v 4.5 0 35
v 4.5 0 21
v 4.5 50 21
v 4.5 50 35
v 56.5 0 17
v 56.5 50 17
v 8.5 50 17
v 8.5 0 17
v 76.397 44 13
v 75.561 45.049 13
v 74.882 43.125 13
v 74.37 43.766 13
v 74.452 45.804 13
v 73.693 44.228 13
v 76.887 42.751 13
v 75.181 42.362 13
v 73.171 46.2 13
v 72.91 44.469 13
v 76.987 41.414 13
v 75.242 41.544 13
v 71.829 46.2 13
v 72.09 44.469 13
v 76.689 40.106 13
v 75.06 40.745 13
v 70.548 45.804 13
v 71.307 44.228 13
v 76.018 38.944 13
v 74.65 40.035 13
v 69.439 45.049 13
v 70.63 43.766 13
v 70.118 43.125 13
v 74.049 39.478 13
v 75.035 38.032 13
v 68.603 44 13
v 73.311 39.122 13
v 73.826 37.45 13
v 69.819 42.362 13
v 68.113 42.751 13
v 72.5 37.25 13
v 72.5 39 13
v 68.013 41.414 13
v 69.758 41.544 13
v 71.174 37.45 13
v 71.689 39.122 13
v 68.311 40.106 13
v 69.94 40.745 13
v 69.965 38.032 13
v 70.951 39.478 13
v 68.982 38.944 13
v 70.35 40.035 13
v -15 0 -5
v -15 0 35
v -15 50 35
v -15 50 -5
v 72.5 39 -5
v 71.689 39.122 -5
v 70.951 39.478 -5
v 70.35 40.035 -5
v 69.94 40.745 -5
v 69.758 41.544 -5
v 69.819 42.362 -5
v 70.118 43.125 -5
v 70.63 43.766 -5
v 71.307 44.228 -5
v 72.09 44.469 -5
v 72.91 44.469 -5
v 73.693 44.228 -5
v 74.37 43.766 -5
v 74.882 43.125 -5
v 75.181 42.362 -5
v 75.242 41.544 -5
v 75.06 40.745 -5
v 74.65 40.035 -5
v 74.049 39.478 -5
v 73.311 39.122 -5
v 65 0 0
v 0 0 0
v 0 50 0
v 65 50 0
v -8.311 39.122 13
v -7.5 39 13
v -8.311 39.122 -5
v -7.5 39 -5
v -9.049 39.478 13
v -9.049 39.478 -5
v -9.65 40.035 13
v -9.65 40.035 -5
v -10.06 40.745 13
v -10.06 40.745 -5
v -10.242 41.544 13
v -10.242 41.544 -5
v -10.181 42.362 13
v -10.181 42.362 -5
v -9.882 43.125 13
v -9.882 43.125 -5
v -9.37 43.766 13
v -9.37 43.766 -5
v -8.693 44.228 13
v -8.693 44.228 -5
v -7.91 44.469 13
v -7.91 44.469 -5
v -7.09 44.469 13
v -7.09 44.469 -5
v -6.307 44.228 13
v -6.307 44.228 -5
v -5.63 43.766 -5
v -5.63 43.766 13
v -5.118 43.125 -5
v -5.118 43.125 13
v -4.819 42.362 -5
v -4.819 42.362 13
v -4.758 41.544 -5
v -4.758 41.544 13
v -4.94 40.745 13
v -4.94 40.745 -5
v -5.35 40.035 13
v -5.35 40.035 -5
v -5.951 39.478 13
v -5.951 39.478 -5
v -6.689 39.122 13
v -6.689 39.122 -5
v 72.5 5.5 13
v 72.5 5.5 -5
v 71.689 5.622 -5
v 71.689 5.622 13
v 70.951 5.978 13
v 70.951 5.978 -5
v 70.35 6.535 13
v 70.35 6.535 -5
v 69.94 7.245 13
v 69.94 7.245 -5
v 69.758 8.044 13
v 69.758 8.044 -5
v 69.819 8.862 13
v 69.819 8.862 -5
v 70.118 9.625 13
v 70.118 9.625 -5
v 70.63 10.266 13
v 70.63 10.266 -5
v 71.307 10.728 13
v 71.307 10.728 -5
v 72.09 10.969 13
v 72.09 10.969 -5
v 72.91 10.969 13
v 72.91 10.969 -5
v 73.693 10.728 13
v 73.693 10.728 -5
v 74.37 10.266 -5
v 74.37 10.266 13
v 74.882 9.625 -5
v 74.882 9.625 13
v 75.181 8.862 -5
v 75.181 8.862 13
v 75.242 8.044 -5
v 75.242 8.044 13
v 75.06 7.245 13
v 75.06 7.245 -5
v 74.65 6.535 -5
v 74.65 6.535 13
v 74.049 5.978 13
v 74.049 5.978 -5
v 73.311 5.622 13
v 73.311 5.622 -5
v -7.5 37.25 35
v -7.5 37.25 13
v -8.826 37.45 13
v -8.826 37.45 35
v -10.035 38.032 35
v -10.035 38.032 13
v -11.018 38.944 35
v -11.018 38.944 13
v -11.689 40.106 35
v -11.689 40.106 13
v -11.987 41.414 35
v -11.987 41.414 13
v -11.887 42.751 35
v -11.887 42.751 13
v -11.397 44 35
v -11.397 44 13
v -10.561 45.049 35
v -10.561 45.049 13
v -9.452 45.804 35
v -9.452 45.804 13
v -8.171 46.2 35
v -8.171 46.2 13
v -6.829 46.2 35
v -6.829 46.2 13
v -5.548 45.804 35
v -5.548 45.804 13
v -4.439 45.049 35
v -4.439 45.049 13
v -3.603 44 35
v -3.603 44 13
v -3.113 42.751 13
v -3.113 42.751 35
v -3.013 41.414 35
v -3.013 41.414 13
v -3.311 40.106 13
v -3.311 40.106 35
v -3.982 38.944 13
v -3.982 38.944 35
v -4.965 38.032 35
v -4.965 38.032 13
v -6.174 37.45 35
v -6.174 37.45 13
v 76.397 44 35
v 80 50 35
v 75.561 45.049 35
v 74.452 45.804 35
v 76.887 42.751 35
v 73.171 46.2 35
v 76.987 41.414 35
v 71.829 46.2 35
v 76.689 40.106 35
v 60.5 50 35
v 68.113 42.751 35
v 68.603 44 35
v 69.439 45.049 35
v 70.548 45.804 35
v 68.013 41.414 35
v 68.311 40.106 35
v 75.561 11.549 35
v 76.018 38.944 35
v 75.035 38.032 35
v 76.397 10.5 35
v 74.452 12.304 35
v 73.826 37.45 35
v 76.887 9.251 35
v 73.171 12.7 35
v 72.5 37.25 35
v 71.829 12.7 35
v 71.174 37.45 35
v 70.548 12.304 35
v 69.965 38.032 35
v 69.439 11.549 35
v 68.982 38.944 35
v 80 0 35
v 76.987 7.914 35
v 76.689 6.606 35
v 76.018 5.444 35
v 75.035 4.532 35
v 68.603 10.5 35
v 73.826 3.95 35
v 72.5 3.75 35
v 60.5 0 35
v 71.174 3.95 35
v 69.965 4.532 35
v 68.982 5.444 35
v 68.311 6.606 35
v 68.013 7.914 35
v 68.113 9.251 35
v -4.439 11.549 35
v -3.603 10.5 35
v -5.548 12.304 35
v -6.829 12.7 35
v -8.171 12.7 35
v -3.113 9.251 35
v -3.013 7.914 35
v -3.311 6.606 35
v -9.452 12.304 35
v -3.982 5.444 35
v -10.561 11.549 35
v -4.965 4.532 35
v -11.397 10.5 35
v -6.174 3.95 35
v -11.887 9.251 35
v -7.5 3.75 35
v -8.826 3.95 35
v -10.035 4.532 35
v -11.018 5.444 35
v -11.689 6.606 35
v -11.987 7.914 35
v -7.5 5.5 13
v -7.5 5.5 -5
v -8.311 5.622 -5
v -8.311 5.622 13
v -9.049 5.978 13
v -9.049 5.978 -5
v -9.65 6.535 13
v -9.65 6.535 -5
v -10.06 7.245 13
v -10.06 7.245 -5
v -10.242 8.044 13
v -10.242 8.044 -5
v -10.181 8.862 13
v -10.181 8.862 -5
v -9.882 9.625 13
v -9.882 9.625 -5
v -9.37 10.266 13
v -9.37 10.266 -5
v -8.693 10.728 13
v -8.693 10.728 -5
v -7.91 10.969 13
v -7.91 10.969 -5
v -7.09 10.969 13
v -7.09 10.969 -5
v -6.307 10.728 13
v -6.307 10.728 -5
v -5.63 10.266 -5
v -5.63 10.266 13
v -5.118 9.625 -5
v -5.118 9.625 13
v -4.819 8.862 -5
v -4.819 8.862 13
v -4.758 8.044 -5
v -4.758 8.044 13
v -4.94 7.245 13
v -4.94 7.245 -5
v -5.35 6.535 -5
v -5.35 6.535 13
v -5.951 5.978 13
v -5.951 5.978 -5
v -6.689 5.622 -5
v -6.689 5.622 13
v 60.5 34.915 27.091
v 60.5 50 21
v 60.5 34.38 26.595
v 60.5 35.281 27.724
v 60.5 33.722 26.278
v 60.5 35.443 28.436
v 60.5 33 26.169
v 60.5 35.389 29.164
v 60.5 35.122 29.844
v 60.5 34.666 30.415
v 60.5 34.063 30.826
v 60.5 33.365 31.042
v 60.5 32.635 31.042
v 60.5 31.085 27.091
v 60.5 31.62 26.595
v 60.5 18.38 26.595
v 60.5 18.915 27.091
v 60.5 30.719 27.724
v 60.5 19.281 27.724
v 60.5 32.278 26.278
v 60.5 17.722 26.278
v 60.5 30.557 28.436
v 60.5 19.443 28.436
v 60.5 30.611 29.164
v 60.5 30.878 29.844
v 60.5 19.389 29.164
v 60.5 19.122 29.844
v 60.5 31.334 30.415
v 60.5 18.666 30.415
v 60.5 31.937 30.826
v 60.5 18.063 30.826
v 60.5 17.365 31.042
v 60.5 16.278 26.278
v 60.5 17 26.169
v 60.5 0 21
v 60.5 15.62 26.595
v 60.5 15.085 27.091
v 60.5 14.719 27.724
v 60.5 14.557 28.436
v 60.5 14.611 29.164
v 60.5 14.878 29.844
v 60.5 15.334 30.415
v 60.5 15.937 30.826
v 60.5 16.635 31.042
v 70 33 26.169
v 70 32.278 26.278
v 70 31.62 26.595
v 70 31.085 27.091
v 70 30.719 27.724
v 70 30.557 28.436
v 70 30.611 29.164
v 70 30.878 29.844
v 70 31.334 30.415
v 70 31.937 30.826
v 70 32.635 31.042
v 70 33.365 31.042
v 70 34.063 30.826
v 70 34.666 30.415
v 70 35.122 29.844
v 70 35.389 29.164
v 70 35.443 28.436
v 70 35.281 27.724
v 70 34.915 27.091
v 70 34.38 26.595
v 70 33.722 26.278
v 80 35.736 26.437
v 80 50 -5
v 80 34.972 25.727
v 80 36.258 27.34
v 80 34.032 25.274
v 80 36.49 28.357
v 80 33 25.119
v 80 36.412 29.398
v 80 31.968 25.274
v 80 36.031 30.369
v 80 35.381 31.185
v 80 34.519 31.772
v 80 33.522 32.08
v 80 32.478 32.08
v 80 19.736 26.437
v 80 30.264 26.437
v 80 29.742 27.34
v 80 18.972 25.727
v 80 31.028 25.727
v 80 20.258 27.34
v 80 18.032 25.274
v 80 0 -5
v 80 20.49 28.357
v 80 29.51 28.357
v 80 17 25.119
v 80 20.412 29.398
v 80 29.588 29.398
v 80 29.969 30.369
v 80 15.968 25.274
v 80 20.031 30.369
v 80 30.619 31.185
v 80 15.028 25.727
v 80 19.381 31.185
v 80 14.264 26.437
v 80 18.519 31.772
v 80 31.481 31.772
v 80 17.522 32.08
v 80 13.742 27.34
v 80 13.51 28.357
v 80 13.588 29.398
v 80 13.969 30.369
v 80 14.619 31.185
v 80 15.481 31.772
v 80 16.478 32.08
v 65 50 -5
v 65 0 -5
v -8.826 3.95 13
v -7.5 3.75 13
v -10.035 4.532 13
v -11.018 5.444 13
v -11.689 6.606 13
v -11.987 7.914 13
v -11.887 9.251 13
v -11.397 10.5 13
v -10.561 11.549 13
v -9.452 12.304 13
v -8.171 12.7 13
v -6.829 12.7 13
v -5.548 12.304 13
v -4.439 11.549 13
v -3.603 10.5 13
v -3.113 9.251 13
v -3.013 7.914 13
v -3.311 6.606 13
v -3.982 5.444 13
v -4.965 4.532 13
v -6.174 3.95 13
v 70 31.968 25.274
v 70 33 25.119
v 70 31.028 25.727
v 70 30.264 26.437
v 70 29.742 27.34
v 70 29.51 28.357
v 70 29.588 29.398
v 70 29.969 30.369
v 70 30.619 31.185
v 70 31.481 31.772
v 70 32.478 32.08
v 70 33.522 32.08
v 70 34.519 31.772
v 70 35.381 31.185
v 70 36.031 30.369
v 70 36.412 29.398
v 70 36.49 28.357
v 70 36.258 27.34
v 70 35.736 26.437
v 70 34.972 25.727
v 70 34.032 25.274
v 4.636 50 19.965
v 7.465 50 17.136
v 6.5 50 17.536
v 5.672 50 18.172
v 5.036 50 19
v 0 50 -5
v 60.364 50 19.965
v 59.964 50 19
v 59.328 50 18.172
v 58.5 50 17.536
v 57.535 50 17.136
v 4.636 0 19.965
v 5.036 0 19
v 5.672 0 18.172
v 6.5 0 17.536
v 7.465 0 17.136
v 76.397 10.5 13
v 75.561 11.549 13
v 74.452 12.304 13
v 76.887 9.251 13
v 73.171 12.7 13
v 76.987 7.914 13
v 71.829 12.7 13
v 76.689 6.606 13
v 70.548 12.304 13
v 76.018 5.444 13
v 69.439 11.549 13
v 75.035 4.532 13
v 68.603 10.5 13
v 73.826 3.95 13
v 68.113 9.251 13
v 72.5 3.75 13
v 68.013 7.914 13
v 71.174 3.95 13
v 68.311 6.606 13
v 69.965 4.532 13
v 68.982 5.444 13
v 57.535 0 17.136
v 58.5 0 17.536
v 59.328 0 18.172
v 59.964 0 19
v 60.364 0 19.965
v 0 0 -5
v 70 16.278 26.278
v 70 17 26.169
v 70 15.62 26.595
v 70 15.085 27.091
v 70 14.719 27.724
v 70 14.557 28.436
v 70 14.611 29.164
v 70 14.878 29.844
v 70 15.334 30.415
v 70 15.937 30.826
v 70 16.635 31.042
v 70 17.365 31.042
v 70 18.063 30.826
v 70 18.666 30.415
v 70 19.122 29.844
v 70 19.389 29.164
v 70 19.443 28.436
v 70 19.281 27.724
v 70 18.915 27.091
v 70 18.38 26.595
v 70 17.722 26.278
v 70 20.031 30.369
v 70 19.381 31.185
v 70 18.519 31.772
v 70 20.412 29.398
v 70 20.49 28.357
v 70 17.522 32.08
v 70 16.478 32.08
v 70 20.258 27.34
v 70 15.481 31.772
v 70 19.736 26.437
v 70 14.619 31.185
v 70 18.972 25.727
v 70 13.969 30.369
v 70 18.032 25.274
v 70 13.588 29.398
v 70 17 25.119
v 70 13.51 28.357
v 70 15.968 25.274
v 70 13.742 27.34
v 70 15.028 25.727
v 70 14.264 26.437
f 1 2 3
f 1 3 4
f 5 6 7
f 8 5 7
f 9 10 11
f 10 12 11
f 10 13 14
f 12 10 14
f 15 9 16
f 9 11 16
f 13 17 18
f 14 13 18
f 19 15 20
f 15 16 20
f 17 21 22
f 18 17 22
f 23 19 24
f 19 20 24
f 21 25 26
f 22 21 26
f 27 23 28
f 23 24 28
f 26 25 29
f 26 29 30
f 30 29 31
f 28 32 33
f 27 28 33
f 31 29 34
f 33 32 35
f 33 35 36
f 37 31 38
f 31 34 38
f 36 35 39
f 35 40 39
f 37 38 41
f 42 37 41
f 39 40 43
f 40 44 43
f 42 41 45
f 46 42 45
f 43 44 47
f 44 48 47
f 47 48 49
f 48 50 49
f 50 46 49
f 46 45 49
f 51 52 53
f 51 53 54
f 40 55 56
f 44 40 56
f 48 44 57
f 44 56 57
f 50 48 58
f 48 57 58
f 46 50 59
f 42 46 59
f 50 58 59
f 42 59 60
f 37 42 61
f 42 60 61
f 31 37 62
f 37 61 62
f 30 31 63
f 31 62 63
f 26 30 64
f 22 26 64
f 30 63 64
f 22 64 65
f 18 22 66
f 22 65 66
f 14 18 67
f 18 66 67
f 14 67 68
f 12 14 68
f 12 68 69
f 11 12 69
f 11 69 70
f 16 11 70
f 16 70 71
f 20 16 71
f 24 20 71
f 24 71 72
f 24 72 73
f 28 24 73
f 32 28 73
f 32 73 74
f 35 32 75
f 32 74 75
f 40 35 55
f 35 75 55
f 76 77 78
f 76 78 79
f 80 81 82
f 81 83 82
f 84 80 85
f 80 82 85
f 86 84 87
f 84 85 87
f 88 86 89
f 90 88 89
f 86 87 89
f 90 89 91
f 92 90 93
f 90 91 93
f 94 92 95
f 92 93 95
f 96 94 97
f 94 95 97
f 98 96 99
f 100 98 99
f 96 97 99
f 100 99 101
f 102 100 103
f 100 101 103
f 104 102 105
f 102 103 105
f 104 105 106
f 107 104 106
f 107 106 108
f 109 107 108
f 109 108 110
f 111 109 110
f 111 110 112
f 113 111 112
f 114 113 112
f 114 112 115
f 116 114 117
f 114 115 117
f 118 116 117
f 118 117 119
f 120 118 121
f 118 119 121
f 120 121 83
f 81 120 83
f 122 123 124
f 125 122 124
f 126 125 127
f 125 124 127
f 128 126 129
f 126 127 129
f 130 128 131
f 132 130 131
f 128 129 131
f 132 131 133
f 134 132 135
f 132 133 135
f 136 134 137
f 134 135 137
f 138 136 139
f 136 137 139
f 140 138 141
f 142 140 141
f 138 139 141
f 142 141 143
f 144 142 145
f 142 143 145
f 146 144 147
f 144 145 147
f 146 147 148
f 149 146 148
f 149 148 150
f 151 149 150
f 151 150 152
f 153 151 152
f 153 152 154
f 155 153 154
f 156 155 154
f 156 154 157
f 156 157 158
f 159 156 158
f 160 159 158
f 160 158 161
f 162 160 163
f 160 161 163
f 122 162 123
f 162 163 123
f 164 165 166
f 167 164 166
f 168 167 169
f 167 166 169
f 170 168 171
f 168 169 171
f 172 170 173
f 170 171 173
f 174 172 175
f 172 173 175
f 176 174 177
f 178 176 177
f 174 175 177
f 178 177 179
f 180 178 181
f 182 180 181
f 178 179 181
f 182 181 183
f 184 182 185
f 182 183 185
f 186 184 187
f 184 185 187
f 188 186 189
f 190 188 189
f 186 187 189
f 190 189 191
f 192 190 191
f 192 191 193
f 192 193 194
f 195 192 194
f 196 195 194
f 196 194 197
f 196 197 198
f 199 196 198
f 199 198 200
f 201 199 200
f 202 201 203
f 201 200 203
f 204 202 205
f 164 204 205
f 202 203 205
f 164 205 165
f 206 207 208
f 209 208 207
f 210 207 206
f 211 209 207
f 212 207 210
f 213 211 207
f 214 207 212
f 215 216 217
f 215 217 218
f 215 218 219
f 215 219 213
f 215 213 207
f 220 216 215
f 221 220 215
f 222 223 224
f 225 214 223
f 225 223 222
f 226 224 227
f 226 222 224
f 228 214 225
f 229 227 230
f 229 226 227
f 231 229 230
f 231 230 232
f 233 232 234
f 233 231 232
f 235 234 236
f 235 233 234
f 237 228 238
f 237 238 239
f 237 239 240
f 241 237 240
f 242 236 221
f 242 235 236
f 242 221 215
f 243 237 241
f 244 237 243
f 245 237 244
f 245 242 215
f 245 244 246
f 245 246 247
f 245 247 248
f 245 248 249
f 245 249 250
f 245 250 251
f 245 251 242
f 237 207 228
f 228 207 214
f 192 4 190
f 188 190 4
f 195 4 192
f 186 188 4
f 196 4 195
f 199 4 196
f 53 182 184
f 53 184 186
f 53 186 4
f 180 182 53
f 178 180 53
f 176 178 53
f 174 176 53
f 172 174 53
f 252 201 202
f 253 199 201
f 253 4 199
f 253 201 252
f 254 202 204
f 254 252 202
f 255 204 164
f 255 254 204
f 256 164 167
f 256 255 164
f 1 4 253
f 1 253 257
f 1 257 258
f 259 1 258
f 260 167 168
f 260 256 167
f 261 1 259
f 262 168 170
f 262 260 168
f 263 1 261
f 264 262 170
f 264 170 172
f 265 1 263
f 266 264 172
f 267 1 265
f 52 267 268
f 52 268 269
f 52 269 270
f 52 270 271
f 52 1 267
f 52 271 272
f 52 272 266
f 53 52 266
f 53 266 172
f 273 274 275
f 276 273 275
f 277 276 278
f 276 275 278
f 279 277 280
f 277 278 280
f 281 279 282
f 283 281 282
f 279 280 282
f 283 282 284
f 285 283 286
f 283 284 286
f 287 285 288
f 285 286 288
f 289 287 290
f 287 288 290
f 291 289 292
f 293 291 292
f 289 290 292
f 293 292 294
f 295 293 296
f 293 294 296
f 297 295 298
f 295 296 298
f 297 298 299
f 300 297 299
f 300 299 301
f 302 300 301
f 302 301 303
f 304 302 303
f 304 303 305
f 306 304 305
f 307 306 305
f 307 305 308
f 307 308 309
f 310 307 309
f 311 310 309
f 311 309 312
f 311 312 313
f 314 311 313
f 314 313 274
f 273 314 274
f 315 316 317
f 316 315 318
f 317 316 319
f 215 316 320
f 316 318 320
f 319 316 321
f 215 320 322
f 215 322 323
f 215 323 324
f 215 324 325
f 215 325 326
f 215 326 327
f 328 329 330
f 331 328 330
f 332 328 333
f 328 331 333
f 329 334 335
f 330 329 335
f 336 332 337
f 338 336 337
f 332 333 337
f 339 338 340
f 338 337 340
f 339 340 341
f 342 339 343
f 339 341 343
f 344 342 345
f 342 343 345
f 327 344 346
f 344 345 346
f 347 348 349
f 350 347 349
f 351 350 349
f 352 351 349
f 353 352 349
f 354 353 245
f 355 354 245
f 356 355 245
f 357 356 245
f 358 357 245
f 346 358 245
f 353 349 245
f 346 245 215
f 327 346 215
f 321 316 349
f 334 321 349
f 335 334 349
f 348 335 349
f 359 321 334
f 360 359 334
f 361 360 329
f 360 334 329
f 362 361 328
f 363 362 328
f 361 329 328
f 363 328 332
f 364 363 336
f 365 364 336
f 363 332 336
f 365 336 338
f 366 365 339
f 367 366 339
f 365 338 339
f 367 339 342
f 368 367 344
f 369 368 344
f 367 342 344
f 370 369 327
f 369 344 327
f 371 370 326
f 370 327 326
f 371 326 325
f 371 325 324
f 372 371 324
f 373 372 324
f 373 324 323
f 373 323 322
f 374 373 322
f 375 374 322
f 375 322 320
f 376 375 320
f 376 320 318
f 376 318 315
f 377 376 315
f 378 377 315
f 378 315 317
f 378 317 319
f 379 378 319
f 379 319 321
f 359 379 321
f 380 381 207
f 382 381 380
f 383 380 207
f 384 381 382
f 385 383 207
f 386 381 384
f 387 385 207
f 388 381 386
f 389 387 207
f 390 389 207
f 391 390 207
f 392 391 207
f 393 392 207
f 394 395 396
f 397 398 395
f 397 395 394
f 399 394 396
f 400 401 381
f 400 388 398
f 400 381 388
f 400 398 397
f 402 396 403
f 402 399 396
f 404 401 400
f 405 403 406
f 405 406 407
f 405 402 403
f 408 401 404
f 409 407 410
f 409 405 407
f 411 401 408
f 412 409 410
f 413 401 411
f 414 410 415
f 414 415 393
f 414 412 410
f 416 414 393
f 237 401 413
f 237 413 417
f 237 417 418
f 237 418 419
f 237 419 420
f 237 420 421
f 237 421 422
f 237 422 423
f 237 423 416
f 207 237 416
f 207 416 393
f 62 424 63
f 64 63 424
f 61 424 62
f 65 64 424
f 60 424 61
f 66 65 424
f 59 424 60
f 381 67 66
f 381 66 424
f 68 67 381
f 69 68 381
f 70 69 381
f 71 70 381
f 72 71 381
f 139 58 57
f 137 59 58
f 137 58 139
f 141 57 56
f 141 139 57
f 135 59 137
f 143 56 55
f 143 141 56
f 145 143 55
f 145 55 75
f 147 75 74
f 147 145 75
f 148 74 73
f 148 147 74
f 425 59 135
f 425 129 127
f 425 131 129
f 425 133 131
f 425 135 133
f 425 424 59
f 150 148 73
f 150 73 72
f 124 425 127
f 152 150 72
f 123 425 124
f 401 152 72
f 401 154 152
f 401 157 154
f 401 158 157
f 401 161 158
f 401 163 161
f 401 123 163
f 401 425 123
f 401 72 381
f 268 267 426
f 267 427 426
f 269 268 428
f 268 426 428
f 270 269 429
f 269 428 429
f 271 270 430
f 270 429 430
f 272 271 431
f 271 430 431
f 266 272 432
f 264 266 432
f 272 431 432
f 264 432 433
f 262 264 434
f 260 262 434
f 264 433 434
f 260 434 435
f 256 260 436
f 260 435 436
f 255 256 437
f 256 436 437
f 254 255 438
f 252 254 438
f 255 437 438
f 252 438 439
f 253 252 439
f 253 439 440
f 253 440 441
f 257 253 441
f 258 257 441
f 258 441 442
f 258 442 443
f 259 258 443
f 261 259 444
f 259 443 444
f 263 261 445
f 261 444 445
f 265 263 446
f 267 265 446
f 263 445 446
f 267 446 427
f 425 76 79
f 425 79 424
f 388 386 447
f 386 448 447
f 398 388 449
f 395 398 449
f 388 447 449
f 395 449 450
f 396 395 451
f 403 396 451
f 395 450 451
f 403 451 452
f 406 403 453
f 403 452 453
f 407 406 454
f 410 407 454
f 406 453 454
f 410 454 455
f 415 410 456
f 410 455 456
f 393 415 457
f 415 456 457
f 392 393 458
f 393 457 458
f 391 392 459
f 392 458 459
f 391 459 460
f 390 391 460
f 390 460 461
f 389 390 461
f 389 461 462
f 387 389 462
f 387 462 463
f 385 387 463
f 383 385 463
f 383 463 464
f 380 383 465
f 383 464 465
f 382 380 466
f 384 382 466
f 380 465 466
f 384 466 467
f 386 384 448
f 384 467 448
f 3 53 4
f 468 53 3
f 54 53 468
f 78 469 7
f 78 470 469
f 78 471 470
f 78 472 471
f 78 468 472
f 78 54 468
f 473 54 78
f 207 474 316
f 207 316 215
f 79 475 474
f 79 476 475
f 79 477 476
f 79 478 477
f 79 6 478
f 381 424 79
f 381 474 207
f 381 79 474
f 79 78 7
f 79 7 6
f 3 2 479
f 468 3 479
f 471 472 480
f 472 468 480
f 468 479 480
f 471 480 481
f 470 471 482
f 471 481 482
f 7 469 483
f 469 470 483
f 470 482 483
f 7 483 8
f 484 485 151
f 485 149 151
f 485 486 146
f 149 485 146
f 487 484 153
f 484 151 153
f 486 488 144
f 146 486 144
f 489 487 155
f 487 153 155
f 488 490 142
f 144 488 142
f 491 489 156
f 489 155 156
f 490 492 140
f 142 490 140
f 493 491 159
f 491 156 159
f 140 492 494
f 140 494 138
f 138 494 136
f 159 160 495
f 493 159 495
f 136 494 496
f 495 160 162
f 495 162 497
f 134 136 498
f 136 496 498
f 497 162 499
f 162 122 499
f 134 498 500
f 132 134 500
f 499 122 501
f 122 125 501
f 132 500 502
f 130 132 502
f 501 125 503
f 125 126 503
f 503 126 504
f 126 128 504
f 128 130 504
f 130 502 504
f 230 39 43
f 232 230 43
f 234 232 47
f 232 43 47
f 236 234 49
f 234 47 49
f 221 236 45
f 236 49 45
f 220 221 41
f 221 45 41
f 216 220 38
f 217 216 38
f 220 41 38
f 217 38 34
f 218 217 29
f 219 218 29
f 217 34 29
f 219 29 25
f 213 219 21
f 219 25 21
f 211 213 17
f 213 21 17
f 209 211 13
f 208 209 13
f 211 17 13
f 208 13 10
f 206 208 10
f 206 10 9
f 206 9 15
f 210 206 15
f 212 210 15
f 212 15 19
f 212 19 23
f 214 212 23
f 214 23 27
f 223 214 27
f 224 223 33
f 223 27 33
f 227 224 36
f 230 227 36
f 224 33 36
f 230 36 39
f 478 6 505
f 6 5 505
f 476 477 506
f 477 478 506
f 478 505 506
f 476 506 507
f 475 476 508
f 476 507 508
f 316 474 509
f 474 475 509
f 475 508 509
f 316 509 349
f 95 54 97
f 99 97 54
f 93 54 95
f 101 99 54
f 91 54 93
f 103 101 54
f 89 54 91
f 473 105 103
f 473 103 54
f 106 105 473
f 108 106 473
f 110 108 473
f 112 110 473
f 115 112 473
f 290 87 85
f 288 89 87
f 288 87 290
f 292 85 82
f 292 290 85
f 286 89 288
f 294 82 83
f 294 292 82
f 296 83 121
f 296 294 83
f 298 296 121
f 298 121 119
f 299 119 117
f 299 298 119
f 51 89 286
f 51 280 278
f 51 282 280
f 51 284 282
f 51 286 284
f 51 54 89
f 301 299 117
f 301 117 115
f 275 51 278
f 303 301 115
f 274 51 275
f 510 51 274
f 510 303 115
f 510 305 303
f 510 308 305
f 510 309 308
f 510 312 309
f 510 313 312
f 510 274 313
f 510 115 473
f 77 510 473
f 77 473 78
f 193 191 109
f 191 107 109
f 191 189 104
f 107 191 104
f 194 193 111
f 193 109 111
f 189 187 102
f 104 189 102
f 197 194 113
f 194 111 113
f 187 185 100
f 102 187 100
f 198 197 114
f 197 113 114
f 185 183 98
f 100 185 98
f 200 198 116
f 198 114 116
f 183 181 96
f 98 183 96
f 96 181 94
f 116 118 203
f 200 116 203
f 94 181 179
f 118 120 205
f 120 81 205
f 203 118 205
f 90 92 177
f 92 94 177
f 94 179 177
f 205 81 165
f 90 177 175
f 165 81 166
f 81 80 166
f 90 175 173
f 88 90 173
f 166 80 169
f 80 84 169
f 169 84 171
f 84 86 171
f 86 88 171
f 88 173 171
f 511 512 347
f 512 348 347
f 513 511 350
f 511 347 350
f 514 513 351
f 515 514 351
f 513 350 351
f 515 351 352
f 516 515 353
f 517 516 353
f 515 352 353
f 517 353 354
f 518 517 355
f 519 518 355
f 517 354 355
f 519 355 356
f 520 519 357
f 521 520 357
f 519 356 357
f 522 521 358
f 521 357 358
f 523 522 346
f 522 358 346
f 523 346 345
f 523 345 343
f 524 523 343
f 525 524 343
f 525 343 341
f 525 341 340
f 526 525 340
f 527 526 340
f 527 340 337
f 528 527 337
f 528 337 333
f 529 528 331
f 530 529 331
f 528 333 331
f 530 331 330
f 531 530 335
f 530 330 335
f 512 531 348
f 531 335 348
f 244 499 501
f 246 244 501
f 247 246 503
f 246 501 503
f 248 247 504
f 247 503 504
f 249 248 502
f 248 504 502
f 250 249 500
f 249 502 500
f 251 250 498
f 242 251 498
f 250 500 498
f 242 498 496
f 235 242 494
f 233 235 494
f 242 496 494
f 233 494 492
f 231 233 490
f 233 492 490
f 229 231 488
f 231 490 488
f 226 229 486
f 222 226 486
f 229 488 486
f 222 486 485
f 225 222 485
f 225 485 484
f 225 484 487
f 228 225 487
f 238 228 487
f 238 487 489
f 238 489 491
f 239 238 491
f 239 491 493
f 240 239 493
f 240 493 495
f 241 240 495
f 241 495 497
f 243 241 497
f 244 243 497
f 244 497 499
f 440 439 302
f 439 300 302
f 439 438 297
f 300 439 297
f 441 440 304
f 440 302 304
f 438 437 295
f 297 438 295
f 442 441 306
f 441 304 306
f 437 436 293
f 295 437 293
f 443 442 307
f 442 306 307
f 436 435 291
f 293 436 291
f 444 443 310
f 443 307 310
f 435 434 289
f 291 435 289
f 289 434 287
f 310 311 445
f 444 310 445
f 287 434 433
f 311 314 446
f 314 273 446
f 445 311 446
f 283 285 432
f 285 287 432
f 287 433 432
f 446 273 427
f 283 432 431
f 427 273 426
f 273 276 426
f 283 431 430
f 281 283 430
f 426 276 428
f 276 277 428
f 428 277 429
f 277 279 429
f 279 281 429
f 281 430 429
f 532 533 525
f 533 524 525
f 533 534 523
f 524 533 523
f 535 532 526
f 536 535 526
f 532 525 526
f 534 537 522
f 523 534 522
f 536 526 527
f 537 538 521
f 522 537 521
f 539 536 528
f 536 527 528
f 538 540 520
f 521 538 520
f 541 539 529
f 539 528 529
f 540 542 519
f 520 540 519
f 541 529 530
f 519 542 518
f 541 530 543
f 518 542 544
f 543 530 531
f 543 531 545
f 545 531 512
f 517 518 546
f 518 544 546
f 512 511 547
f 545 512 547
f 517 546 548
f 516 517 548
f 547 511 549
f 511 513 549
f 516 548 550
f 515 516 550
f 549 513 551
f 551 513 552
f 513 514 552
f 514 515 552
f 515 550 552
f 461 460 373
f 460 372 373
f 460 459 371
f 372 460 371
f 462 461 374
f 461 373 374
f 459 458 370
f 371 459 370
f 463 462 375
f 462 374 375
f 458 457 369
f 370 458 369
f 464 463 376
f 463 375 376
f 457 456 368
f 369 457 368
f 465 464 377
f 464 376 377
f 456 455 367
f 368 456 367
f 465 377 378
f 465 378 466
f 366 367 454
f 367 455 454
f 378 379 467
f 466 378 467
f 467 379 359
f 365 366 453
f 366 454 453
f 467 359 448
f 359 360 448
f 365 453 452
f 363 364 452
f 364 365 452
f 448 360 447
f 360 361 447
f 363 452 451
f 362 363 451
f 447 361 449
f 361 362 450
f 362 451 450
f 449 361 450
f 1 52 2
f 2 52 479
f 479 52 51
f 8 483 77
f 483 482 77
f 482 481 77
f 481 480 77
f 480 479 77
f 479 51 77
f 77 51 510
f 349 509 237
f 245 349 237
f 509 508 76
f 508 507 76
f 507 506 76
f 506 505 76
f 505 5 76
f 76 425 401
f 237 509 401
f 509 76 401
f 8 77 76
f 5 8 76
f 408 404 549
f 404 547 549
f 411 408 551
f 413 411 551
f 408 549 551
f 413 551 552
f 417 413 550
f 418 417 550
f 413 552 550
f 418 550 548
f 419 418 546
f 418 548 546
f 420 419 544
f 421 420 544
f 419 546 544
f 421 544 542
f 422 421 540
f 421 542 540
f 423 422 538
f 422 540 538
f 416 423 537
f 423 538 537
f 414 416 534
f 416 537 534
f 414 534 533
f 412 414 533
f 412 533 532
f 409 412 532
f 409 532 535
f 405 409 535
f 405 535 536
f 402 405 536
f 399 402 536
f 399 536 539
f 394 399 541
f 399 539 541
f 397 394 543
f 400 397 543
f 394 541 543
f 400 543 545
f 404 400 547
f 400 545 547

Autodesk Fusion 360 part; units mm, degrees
sketch "Sketch1" plane through (0, 0, 0) normal (0, 1, 0) x (1, 0, 0)
  line L0 (0, 0) -> (65, 0)
  line L1 (65, 0) -> (65, 5)
  line L2 (65, 5) -> (80, 5)
  line L3 (80, 5) -> (80, -35)
  line L4 (80, -35) -> (0, -35)
  line L5 (0, -35) -> (-15, -35)
  line L6 (-15, -35) -> (-15, 5)
  line L7 (-15, 5) -> (0, 5)
  line L8 (0, 5) -> (0, 0)
  line L9 (32.5, 0) -> (32.5, -35) construction
  line L10 (32.5, 0) -> (4.5, 0) construction
  line L11 (32.5, 0) -> (60.5, 0) construction
  line L12 (60.5, 0) -> (60.5, -17) construction
  line L13 (56.5, -17) -> (8.5, -17)
  line L14 (4.5, -21) -> (4.5, -35)
  line L15 (60.5, -21) -> (60.5, -35)
  arc A0 (8.5, -17) -> (4.5, -21) centre (8.5, -21) ccw
  arc A1 (60.5, -21) -> (56.5, -17) centre (56.5, -21) ccw
  point P0 (4.5, -17)
  dimension "d1" = 65
  dimension "d2" = 28
  dimension "d3" = 28
  dimension "d4" = 17
  dimension "d5" = 56
  dimension "d6" = 4
  dimension "d7" = 4
extrude "Extrude1" add sketch "Sketch1" along normal blind 50 contours L0 L1 L2 L3 L4 L5 L6 L7 L8 L13 L14 L15 A0 A1
sketch "Sketch2" plane through (0, 0, 35) normal (0, 0, 1) x (1, 0, 0)
  line L0 (-15, 0) -> (4.5, 0)
  line L1 (4.5, 0) -> (4.5, 50)
  line L2 (4.5, 50) -> (-15, 50)
  line L3 (-15, 50) -> (-15, 0)
  line L4 (-15, 25) -> (80, 25) construction
  line L5 (32.5, 0.0866) -> (32.5, 50) construction
  line L6 (32.5, 25) -> (72.5, 25) construction
  line L7 (72.5, 25) -> (72.5, 41.75) construction
  line L8 (72.5, 25) -> (72.5, 8.25) construction
  line L9 (72.5, 41.75) -> (-7.5, 41.75) construction
  line L10 (72.5, 8.25) -> (-7.5, 8.25) construction
  point P0 (-7.5, 41.75)
  point P1 (72.5, 41.75)
  point P2 (72.5, 8.25)
  point P3 (-7.5, 8.25)
  dimension "d10" = 40
  dimension "d11" = 16.75
  dimension "d12" = 16.75
  dimension "d13" = 80
  dimension "d14" = 80
hole "Hole1" at (-7.5, 41.75, 35) at (72.5, 41.75, 35) at (72.5, 8.25, 35) at (-7.5, 8.25, 35) direction (0, 0, -1) diameter 5.5 depth 40 tip angle 118 counterbore diameter 9 counterbore depth 22
sketch "Sketch3" plane through (80, 0, 0) normal (1, 0, 0) x (0, 0, -1)
  line L0 (-35, 0) -> (5, 0)
  line L1 (5, 0) -> (5, 50)
  line L2 (5, 50) -> (-35, 50)
  line L3 (-35, 50) -> (-35, 0)
  line L4 (5, 25) -> (-35, 25) construction
  line L5 (-28.6189, 25) -> (-28.6189, 33) construction
  line L6 (-28.6189, 33) -> (-28.6189, 17) construction
  point P0 (-28.6189, 33)
  point P1 (-28.6189, 17)
hole "Hole2" at (80, 17, 28.6189) at (80, 33, 28.6189) direction (-1, 0, 0) diameter 4.9 depth 40 tip angle 118 counterbore diameter 7 counterbore depth 10
